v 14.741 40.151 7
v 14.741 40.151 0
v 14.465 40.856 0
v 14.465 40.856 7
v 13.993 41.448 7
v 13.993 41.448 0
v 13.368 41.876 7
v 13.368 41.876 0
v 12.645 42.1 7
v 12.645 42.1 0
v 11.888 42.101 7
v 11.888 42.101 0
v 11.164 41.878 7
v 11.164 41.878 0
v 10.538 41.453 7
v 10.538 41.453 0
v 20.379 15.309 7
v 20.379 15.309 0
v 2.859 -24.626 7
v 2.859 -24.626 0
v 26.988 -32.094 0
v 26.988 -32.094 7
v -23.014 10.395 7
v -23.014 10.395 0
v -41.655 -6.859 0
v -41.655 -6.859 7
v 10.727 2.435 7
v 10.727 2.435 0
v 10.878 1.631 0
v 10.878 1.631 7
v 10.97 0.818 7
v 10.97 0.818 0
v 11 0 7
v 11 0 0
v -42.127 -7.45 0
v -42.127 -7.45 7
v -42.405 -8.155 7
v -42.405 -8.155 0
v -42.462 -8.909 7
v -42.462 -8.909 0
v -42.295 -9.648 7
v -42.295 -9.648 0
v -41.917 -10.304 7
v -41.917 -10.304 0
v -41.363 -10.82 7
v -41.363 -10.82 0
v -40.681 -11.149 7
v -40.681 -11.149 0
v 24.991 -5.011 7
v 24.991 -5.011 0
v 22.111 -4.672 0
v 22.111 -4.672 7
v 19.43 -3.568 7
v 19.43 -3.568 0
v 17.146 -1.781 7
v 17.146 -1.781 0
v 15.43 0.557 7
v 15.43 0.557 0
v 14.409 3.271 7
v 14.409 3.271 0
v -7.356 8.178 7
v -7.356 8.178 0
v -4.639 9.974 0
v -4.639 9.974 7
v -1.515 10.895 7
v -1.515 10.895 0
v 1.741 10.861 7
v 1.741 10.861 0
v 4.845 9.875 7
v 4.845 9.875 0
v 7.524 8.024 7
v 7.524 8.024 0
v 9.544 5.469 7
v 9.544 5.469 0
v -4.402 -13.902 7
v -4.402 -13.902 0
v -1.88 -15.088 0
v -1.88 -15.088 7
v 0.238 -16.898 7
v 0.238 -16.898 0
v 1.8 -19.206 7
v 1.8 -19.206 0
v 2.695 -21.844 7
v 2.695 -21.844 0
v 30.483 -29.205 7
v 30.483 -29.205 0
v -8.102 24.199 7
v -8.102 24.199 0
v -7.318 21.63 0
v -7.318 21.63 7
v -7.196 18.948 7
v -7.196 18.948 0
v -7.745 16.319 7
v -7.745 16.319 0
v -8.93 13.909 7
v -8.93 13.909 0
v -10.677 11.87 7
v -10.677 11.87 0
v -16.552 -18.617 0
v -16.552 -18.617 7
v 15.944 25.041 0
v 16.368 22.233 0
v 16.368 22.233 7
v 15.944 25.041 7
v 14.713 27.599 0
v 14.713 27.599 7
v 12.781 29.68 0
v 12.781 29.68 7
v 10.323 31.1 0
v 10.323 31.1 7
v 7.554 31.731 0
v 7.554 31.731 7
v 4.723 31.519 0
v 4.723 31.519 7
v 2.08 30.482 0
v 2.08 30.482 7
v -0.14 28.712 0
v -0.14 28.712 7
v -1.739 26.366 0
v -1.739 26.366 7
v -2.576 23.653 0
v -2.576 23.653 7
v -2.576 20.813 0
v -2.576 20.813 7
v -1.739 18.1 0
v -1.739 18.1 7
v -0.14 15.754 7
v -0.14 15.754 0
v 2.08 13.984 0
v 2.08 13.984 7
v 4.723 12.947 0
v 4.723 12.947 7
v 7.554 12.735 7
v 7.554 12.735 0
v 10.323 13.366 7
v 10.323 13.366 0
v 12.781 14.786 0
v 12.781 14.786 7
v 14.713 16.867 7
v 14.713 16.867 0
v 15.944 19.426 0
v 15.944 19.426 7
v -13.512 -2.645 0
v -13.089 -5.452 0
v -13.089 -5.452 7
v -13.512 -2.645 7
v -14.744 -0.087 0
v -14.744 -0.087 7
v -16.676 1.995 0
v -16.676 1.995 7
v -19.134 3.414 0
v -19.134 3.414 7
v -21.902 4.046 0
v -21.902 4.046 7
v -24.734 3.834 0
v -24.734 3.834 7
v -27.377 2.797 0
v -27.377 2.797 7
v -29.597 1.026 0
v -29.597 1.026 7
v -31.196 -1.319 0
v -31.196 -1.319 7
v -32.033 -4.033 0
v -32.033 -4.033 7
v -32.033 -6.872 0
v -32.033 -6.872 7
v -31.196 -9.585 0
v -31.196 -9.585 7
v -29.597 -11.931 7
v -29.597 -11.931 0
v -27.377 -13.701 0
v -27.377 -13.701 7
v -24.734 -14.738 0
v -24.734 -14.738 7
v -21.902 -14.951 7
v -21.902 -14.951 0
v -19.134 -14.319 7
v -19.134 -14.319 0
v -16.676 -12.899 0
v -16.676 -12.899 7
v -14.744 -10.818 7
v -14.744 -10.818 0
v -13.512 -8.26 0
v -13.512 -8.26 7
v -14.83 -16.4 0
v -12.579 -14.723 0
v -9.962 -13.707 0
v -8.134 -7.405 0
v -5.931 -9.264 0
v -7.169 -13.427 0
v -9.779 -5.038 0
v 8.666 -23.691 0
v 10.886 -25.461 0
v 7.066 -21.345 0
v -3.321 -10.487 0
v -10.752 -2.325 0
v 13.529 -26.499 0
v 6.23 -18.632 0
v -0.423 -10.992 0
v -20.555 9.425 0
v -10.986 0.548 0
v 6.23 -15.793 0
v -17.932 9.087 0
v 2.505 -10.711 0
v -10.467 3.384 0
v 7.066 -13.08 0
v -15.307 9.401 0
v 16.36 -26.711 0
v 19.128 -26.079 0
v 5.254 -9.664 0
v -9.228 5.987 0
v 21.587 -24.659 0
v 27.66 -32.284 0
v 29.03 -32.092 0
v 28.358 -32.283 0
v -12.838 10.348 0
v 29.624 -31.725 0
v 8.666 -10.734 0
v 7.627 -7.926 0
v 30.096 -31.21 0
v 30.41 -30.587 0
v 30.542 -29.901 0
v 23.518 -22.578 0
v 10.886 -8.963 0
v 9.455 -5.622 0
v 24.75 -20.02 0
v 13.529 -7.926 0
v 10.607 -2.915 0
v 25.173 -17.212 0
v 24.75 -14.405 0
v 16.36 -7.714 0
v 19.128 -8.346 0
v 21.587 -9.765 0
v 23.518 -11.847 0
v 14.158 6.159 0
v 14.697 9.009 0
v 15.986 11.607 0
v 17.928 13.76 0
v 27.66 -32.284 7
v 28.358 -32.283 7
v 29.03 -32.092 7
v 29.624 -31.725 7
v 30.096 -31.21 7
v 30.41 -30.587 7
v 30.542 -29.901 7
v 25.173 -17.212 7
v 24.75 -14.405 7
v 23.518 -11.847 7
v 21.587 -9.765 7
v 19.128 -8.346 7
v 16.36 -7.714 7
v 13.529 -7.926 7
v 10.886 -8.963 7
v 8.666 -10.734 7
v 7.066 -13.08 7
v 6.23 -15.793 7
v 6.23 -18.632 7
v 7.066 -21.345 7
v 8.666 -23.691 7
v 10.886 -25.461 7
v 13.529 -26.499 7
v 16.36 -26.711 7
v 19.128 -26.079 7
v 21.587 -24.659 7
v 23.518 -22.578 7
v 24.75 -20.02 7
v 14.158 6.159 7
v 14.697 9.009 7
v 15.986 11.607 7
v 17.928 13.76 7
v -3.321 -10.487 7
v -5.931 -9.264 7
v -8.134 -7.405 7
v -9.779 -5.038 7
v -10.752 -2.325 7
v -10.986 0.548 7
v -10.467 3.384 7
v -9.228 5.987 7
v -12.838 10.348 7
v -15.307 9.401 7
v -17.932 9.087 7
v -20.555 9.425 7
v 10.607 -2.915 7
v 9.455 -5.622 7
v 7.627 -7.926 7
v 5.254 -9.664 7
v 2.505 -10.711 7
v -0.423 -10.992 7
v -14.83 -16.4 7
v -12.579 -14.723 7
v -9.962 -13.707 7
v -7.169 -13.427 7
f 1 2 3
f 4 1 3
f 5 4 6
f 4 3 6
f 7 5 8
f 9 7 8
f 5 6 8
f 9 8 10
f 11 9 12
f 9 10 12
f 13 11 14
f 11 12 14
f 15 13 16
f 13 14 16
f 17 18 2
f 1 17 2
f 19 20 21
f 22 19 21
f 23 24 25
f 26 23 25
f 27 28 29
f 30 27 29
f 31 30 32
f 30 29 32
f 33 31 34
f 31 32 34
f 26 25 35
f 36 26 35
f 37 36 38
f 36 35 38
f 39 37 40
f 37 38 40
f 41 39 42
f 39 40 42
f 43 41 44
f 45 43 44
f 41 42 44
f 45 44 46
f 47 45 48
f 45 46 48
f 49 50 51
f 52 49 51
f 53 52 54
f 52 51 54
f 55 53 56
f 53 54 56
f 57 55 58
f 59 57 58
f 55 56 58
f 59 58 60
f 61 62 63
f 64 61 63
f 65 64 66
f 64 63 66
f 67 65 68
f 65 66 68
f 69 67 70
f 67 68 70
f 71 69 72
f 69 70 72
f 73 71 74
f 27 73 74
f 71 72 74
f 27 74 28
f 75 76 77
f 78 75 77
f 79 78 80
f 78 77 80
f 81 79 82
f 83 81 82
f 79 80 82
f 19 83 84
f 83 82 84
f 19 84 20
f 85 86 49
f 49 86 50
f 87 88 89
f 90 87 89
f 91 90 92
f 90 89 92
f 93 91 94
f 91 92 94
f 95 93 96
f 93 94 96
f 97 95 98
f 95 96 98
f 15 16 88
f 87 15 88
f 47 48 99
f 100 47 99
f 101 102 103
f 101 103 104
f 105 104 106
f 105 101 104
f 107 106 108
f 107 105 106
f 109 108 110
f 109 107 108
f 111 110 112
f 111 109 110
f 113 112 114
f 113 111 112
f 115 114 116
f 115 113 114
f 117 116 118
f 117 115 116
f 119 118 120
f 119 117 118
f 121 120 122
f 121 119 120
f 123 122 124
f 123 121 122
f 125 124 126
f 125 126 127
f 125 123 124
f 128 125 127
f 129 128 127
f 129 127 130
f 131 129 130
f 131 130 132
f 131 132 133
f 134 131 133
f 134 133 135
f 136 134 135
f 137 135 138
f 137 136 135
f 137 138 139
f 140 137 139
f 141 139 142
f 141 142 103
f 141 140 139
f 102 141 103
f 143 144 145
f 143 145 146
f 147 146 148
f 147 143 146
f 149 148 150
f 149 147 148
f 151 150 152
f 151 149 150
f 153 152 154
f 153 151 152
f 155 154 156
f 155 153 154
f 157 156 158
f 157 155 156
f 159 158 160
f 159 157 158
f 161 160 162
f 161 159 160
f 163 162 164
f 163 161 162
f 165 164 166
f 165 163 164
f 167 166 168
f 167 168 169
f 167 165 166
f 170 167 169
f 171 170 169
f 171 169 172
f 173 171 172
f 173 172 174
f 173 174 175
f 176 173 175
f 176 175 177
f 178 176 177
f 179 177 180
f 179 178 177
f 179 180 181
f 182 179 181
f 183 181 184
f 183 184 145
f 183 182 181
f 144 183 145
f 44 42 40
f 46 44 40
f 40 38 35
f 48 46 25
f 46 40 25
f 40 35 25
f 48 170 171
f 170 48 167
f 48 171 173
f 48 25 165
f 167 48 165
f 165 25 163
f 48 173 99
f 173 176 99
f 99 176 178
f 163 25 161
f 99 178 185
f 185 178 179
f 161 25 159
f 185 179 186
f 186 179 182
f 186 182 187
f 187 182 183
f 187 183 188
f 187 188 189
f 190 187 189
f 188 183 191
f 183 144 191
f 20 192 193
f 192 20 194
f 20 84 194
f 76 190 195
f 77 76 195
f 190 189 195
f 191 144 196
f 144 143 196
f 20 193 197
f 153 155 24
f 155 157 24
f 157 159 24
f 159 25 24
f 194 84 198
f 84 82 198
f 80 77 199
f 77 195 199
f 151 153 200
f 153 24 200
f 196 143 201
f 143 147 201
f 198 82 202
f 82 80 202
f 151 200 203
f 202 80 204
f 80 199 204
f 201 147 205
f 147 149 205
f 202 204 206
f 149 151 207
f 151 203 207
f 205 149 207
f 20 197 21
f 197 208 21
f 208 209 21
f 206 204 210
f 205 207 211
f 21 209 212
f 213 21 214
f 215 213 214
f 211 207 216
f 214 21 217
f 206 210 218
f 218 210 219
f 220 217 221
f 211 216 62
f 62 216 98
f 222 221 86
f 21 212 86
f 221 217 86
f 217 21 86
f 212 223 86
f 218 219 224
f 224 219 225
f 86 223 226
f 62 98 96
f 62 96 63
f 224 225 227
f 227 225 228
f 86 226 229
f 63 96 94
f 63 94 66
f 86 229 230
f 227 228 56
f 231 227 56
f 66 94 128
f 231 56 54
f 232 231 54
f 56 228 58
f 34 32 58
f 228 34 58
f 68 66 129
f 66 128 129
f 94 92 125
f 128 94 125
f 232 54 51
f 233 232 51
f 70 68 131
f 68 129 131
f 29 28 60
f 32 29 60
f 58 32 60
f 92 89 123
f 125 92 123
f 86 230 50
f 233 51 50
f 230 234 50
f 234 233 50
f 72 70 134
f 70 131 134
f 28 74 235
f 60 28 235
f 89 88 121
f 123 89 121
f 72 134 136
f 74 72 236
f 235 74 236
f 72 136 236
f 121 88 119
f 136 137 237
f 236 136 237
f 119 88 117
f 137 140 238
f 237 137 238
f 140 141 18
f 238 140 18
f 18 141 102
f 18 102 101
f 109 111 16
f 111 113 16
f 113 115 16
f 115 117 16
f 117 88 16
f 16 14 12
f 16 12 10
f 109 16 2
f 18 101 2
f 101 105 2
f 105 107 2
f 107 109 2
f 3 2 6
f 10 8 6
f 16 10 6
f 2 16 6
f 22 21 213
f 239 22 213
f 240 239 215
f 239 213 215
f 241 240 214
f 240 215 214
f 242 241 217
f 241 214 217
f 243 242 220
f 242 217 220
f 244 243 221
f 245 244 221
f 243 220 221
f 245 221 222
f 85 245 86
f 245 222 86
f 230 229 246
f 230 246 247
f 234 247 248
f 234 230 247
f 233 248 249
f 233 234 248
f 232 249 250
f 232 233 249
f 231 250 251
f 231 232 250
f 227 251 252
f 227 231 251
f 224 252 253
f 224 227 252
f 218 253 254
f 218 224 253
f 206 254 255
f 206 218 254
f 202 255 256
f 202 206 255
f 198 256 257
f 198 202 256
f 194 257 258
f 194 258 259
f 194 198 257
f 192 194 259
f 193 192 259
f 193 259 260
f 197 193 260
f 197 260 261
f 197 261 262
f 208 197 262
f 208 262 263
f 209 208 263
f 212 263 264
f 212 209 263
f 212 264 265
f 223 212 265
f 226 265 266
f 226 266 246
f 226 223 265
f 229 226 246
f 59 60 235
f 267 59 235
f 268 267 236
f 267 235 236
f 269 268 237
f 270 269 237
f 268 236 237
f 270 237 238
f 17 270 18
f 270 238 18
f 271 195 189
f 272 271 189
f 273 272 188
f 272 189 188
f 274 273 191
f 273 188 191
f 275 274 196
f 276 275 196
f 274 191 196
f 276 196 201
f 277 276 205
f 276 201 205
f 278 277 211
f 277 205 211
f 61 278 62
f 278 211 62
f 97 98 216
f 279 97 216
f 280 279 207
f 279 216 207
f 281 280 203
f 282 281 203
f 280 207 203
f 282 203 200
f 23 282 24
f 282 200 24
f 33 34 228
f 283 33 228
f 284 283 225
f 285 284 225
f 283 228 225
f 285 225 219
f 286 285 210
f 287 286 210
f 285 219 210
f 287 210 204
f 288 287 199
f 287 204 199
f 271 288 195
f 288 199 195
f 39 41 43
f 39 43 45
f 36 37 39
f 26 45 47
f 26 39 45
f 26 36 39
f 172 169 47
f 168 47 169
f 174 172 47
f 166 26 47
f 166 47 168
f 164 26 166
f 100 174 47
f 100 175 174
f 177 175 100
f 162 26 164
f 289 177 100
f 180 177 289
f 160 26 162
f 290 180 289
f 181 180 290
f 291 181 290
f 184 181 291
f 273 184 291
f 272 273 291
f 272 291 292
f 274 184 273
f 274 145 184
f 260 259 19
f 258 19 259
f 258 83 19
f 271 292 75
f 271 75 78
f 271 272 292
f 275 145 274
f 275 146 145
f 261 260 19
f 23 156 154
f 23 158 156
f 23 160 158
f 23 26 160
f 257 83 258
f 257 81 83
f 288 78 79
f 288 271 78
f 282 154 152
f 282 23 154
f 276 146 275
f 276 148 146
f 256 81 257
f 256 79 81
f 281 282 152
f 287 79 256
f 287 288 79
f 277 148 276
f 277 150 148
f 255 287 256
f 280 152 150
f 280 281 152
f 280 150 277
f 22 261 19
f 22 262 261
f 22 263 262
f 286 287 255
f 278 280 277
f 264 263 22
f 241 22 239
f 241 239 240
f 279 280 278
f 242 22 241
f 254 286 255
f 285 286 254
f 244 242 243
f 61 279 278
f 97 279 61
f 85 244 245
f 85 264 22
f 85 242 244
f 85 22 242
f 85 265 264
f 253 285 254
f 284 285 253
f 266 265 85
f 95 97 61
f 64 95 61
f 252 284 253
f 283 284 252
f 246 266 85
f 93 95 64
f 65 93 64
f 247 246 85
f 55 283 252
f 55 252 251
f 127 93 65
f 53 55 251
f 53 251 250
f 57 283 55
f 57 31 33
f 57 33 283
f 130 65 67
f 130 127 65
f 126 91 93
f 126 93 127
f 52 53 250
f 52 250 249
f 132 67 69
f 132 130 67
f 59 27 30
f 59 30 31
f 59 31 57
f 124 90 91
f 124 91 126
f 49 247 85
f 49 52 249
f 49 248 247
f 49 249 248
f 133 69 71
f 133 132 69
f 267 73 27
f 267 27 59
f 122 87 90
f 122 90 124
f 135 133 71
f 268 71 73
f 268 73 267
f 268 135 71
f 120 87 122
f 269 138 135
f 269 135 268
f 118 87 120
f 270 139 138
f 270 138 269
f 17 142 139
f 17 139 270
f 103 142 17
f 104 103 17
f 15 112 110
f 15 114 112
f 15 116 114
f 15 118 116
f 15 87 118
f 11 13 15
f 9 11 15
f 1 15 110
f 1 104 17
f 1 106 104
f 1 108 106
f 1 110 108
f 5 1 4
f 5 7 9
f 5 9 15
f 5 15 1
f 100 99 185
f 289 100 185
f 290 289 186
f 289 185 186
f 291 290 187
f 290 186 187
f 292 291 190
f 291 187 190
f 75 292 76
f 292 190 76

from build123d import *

# Parameters (mm, degrees)
F0_R     = 9.525
F1_DEPTH = 7


with BuildPart() as f1:
    # F0 (on Top) → F1 (new body)
    with BuildSketch(Plane.XY):
        with BuildLine():
            ThreePointArc((-7.356254, 8.178357), (3.329824, 10.483905), (10.727142, 2.434838))
            Line((10.727142, 2.434838), (14.408928, 3.270526))
            ThreePointArc((14.408928, 3.270526), (15.252655, 10.351743), (20.379099, 15.309069))
            Line((20.379099, 15.309069), (14.740562, 40.150721))
            ThreePointArc((14.740562, 40.150721), (13.015163, 42.014748), (10.538168, 41.452522))
            Line((10.538168, 41.452522), (-8.102103, 24.198528))
            ThreePointArc((-8.102103, 24.198528), (-7.387937, 17.616196), (-10.676531, 11.869695))
            Line((-10.676531, 11.869695), (-7.356254, 8.178357))
        make_face()
        with Locations((6.842669, 22.233071)):
            Circle(F0_R, mode=Mode.SUBTRACT)
        with BuildLine():
            Line((-4.402173, -13.902461), (-3.320622, -10.486824))
            ThreePointArc((-3.320622, -10.486824), (-10.751566, -2.324615), (-7.356254, 8.178357))
            Line((-7.356254, 8.178357), (-10.676531, 11.869695))
            ThreePointArc((-10.676531, 11.869695), (-16.61004, 9.162756), (-23.01432, 10.395333))
            Line((-23.01432, 10.395333), (-41.654591, -6.85866))
            ThreePointArc((-41.654591, -6.85866), (-42.406186, -9.284914), (-40.680787, -11.148941))
            Line((-40.680787, -11.148941), (-16.55213, -18.617483))
            ThreePointArc((-16.55213, -18.617483), (-11.304982, -14.126767), (-4.402173, -13.902461))
        make_face()
        with Locations((-22.614271, -5.452181)):
            Circle(F0_R, mode=Mode.SUBTRACT)
        with BuildLine():
            ThreePointArc((10.727142, 2.434838), (10.931573, 1.225039), (11, 0))
            ThreePointArc((11, 0), (6.498968, -8.874876), (-3.320622, -10.486824))
            Line((-3.320622, -10.486824), (-4.402173, -13.902461))
            ThreePointArc((-4.402173, -13.902461), (1.09613, -17.999523), (2.859245, -24.625885))
            Line((2.859245, -24.625885), (26.987902, -32.094427))
            ThreePointArc((26.987902, -32.094427), (29.624289, -31.725007), (30.482894, -29.205125))
            Line((30.482894, -29.205125), (24.991316, -5.010931))
            ThreePointArc((24.991316, -5.010931), (18.227056, -2.752546), (14.408928, 3.270526))
            Line((14.408928, 3.270526), (10.727142, 2.434838))
        make_face()
        with Locations((15.648209, -17.212353)):
            Circle(F0_R, mode=Mode.SUBTRACT)
    extrude(amount=F1_DEPTH)


solid = f1.part
